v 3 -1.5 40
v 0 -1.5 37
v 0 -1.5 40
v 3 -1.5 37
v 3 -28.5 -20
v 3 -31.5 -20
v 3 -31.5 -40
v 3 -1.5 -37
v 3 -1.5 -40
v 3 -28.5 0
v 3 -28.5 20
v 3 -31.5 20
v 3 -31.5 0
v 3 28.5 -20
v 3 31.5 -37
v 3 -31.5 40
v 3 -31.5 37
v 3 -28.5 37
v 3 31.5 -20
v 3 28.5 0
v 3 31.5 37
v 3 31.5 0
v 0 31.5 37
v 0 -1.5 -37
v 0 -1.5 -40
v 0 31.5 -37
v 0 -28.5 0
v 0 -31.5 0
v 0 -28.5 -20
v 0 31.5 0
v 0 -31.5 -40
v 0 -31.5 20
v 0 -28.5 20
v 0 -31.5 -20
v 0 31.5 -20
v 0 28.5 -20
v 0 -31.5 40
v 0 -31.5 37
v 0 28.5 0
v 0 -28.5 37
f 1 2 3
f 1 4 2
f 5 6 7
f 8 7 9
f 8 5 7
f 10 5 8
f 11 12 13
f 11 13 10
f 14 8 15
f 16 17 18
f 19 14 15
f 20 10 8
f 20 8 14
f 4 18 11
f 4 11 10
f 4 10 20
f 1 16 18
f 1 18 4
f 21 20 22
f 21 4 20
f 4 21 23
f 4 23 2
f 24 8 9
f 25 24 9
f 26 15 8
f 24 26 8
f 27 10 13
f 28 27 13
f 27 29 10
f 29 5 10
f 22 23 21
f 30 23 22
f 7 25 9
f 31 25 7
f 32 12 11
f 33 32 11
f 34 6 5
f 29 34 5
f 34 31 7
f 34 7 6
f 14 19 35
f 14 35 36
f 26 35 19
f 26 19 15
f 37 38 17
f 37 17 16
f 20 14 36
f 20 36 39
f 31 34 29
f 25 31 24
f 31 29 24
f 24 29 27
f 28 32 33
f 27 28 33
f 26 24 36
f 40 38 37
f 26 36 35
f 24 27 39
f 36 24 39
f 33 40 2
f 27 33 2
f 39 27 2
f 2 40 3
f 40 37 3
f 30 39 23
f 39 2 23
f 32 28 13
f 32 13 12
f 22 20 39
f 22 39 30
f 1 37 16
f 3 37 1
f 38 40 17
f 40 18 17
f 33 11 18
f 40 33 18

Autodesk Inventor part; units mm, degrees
ref_plane "YZ Plane" through (0, 0, 0) normal (1, 0, 0) x (0, 1, 0)
ref_plane "XZ Plane" through (0, 0, 0) normal (0, 1, 0) x (-1, 0, 0)
ref_plane "XY Plane" through (0, 0, 0) normal (0, 0, 1) x (1, 0, 0)
sketch "Sketch1" plane through (0, 0, 0) normal (1, 0, 0) x (0, 1, 0)
  line L0 (-31.5, 40) -> (31.5, 40)
  line L1 (31.5, 40) -> (31.5, -40)
  line L2 (31.5, -40) -> (-31.5, -40)
  line L3 (-31.5, -40) -> (-31.5, 40)
  line L4 (-31.5, 40) -> (31.5, -40) construction
  line L5 (31.5, 40) -> (-31.5, -40) construction
  point P0 (0, 0)
  dimension "d0" = 63
  dimension "d1" = 80
extrude "Extrusion1" add sketch "Sketch1" along normal blind 3
sketch "Sketch2" plane through (3, 0, 0) normal (1, 0, 0) x (0, 0, -1)
  line L0 (40, -31.5) -> (40, 31.5) projected
  line L1 (40, 31.5) -> (37, 31.5)
  line L2 (37, 31.5) -> (37, -1.5)
  line L3 (37, -1.5) -> (40, -1.5)
  line L4 (40, -1.5) -> (40, 31.5)
  line L5 (-40, -31.5) -> (40, -31.5) projected
  line L6 (0, -31.5) -> (20, -31.5)
  line L7 (20, -31.5) -> (20, -28.5)
  line L8 (20, -28.5) -> (0, -28.5)
  line L9 (0, -28.5) -> (0, -31.5)
  line L10 (-37, -31.5) -> (-20, -31.5)
  line L11 (-20, -31.5) -> (-20, -28.5)
  line L12 (-20, -28.5) -> (-37, -28.5)
  line L13 (-37, -28.5) -> (-37, -31.5)
  point P0 (0, 0)
  dimension "d4" = 3
  dimension "d5" = 30
  dimension "d6" = 20
  dimension "d7" = 3
  dimension "d8" = 20
  dimension "d9" = 17
  dimension "d10" = 3
  dimension "d11" = 20
extrude "Extrusion2" cut sketch "Sketch2" against normal through all
sketch "Sketch3" plane through (3, 0, 0) normal (1, 0, 0) x (0, 0, -1)
  line L0 (-40, 31.5) -> (-40, -31.5) projected
  line L1 (-40, 31.5) -> (-37, 31.5)
  line L2 (-37, 31.5) -> (-37, -1.5)
  line L3 (-37, -1.5) -> (-40, -1.5)
  line L4 (-40, -1.5) -> (-40, 31.5)
  point P0 (0, 0)
  dimension "d14" = 3
  dimension "d15" = 33
extrude "Extrusion3" cut sketch "Sketch3" against normal through all
sketch "Sketch4" plane through (3, 0, 0) normal (1, 0, 0) x (0, 0, -1)
  line L0 (37, 31.5) -> (-37, 31.5) projected
  line L1 (0, 31.5) -> (20, 31.5)
  line L2 (20, 31.5) -> (20, 28.5)
  line L3 (20, 28.5) -> (0, 28.5)
  line L4 (0, 28.5) -> (0, 31.5)
  line L5 (37, -1.5) -> (37, 31.5) projected
  point P0 (0, 0)
  dimension "d18" = 20
  dimension "d19" = 3
  dimension "d20" = 17
extrude "Extrusion4" cut sketch "Sketch4" against normal through all
properties part number "side"
